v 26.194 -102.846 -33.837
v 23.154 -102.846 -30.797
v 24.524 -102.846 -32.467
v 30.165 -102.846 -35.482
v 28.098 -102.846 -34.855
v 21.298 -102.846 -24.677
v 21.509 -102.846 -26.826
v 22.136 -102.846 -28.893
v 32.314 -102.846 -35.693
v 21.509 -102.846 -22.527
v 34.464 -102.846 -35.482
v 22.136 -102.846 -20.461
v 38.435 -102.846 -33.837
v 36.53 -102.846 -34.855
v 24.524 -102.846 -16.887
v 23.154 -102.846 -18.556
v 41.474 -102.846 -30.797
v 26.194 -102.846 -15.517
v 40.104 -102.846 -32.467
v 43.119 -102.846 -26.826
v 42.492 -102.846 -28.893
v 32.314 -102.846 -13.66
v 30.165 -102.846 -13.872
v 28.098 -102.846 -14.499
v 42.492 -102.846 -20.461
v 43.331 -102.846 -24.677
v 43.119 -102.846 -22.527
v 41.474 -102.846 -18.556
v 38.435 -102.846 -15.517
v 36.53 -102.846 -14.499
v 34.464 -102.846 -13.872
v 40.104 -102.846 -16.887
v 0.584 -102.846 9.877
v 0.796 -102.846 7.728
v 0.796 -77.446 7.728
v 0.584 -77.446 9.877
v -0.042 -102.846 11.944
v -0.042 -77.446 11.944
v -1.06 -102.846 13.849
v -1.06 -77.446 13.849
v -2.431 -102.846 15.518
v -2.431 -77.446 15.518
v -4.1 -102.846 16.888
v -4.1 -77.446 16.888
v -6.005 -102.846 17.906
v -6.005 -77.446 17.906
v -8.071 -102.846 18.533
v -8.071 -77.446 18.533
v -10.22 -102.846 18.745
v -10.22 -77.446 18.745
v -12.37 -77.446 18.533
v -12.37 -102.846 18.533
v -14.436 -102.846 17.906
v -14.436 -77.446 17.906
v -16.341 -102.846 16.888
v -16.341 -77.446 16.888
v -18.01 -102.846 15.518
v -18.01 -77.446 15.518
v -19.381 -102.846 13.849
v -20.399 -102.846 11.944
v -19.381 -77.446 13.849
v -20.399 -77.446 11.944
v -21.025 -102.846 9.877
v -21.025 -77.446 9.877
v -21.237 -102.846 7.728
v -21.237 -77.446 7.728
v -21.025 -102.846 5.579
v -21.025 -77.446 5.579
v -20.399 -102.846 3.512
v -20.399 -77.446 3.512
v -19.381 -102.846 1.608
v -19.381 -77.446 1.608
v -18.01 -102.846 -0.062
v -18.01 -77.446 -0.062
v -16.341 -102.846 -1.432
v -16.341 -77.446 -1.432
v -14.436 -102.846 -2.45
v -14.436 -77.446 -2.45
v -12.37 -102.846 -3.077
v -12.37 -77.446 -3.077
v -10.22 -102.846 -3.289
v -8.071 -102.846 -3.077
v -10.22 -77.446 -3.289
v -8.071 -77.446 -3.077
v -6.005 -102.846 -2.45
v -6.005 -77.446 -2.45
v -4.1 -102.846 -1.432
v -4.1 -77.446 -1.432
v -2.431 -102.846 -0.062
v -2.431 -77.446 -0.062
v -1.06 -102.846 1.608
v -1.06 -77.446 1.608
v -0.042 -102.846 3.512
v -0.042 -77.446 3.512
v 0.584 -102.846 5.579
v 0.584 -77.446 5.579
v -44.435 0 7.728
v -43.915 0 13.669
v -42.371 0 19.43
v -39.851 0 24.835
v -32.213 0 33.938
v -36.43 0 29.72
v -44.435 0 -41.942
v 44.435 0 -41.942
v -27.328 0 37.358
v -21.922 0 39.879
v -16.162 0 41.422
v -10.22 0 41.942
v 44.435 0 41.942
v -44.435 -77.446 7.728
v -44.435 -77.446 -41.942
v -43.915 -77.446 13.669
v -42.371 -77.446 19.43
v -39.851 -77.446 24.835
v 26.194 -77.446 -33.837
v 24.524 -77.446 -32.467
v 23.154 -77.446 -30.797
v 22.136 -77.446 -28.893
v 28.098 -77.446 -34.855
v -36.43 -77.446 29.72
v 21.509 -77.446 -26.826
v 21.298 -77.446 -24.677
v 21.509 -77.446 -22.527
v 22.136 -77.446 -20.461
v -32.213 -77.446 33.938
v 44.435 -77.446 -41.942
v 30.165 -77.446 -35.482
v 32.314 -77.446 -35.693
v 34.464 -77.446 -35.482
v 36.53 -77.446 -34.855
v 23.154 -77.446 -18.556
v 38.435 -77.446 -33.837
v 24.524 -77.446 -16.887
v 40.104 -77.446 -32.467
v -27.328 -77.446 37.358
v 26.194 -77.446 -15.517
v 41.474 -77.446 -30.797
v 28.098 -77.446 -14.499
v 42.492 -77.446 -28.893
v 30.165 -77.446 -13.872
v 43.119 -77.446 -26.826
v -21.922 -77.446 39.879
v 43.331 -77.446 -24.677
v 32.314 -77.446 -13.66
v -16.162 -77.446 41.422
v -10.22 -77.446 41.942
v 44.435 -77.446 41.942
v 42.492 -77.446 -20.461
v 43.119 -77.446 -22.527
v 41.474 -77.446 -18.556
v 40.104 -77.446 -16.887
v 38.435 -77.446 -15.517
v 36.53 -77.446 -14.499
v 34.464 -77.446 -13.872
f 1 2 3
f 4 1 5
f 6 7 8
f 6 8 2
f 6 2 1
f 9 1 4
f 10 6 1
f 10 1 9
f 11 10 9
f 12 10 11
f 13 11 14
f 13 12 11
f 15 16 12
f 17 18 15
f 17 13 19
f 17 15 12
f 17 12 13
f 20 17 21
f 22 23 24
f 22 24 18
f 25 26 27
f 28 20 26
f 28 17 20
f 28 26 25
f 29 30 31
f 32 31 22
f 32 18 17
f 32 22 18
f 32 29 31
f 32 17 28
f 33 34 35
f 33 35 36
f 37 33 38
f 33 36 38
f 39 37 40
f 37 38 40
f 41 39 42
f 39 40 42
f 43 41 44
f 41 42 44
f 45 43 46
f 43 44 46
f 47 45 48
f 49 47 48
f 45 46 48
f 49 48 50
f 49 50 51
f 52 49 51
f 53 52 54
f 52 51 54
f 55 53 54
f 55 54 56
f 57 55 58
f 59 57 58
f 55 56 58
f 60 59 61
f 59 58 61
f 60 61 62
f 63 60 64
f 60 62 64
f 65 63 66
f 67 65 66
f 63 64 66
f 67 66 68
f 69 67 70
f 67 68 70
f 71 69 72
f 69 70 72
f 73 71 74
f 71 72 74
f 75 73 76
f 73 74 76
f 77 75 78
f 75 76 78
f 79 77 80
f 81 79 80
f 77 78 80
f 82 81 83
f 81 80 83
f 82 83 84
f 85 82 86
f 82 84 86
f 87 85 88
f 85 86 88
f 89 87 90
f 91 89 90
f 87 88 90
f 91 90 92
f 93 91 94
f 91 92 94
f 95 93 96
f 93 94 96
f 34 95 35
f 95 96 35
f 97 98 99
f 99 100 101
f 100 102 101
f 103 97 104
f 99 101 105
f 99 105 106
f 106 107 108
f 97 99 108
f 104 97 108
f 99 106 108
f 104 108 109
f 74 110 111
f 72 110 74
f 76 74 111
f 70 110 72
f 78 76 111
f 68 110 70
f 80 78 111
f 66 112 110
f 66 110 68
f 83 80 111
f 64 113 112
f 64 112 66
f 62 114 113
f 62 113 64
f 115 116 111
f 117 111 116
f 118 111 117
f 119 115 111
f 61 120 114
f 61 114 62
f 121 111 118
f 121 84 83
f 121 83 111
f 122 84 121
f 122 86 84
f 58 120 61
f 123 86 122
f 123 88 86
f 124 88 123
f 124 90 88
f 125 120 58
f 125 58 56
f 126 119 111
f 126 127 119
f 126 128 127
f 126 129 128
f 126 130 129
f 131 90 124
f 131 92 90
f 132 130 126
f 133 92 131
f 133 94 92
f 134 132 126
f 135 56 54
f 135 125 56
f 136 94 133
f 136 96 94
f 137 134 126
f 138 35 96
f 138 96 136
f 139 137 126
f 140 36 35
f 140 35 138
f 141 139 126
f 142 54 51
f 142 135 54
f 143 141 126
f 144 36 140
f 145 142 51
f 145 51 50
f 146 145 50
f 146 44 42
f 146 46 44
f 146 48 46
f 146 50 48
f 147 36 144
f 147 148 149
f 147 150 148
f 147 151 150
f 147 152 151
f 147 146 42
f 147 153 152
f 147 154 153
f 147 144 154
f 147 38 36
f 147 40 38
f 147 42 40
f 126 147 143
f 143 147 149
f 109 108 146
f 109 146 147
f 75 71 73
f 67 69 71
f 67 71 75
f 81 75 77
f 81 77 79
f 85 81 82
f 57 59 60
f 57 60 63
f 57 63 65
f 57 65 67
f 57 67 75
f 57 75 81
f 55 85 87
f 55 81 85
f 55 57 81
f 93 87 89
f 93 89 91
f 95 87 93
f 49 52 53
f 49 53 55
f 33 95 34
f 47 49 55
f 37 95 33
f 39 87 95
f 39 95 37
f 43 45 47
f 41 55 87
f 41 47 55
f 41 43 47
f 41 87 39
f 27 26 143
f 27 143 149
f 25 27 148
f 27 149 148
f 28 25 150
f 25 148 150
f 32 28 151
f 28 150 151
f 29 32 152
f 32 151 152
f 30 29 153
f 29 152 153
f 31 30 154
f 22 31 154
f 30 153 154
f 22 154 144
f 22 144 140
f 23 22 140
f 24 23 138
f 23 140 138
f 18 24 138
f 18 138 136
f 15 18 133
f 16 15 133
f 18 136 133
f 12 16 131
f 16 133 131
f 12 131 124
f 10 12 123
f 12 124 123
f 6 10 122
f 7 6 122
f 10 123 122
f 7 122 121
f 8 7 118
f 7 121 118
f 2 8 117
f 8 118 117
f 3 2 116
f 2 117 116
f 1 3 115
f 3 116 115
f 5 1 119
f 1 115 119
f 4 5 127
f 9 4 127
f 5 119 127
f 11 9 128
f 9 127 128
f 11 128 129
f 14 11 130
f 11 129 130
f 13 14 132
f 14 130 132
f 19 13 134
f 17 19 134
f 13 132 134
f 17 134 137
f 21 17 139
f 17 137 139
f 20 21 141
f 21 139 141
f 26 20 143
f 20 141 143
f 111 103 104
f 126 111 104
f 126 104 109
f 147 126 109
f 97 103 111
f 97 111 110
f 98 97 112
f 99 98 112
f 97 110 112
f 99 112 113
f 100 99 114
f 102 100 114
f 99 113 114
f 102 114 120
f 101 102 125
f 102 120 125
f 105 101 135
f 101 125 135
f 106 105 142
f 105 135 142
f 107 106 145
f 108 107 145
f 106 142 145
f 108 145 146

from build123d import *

# Parameters (mm, degrees)
F0_W     = 88.869118
F0_H     = 83.88424
F1_DEPTH = 77.4465
F2_R     = 34.214066
F3_R     = 11.016675
F4_DEPTH = 25.4


with BuildPart() as f1:
    # F0 (on Front) → F1 (new body)
    with BuildSketch(Plane.XZ):
        Rectangle(F0_W, F0_H)
    extrude(amount=F1_DEPTH)

    # F2
    f2_edges = [f1.edges().sort_by_distance(p)[0] for p in [
        (-44.434559, -38.72325, 41.94212),
    ]]
    fillet(f2_edges, radius=F2_R)

    # F3 (on face) → F4 (join)
    with BuildSketch(Plane.XZ.offset(77.4465)):
        with Locations((-10.220493, 7.728054)):
            Circle(F3_R)
        with Locations((32.314323, -24.676727)):
            Circle(F3_R)
    extrude(amount=F4_DEPTH)


solid = f1.part
